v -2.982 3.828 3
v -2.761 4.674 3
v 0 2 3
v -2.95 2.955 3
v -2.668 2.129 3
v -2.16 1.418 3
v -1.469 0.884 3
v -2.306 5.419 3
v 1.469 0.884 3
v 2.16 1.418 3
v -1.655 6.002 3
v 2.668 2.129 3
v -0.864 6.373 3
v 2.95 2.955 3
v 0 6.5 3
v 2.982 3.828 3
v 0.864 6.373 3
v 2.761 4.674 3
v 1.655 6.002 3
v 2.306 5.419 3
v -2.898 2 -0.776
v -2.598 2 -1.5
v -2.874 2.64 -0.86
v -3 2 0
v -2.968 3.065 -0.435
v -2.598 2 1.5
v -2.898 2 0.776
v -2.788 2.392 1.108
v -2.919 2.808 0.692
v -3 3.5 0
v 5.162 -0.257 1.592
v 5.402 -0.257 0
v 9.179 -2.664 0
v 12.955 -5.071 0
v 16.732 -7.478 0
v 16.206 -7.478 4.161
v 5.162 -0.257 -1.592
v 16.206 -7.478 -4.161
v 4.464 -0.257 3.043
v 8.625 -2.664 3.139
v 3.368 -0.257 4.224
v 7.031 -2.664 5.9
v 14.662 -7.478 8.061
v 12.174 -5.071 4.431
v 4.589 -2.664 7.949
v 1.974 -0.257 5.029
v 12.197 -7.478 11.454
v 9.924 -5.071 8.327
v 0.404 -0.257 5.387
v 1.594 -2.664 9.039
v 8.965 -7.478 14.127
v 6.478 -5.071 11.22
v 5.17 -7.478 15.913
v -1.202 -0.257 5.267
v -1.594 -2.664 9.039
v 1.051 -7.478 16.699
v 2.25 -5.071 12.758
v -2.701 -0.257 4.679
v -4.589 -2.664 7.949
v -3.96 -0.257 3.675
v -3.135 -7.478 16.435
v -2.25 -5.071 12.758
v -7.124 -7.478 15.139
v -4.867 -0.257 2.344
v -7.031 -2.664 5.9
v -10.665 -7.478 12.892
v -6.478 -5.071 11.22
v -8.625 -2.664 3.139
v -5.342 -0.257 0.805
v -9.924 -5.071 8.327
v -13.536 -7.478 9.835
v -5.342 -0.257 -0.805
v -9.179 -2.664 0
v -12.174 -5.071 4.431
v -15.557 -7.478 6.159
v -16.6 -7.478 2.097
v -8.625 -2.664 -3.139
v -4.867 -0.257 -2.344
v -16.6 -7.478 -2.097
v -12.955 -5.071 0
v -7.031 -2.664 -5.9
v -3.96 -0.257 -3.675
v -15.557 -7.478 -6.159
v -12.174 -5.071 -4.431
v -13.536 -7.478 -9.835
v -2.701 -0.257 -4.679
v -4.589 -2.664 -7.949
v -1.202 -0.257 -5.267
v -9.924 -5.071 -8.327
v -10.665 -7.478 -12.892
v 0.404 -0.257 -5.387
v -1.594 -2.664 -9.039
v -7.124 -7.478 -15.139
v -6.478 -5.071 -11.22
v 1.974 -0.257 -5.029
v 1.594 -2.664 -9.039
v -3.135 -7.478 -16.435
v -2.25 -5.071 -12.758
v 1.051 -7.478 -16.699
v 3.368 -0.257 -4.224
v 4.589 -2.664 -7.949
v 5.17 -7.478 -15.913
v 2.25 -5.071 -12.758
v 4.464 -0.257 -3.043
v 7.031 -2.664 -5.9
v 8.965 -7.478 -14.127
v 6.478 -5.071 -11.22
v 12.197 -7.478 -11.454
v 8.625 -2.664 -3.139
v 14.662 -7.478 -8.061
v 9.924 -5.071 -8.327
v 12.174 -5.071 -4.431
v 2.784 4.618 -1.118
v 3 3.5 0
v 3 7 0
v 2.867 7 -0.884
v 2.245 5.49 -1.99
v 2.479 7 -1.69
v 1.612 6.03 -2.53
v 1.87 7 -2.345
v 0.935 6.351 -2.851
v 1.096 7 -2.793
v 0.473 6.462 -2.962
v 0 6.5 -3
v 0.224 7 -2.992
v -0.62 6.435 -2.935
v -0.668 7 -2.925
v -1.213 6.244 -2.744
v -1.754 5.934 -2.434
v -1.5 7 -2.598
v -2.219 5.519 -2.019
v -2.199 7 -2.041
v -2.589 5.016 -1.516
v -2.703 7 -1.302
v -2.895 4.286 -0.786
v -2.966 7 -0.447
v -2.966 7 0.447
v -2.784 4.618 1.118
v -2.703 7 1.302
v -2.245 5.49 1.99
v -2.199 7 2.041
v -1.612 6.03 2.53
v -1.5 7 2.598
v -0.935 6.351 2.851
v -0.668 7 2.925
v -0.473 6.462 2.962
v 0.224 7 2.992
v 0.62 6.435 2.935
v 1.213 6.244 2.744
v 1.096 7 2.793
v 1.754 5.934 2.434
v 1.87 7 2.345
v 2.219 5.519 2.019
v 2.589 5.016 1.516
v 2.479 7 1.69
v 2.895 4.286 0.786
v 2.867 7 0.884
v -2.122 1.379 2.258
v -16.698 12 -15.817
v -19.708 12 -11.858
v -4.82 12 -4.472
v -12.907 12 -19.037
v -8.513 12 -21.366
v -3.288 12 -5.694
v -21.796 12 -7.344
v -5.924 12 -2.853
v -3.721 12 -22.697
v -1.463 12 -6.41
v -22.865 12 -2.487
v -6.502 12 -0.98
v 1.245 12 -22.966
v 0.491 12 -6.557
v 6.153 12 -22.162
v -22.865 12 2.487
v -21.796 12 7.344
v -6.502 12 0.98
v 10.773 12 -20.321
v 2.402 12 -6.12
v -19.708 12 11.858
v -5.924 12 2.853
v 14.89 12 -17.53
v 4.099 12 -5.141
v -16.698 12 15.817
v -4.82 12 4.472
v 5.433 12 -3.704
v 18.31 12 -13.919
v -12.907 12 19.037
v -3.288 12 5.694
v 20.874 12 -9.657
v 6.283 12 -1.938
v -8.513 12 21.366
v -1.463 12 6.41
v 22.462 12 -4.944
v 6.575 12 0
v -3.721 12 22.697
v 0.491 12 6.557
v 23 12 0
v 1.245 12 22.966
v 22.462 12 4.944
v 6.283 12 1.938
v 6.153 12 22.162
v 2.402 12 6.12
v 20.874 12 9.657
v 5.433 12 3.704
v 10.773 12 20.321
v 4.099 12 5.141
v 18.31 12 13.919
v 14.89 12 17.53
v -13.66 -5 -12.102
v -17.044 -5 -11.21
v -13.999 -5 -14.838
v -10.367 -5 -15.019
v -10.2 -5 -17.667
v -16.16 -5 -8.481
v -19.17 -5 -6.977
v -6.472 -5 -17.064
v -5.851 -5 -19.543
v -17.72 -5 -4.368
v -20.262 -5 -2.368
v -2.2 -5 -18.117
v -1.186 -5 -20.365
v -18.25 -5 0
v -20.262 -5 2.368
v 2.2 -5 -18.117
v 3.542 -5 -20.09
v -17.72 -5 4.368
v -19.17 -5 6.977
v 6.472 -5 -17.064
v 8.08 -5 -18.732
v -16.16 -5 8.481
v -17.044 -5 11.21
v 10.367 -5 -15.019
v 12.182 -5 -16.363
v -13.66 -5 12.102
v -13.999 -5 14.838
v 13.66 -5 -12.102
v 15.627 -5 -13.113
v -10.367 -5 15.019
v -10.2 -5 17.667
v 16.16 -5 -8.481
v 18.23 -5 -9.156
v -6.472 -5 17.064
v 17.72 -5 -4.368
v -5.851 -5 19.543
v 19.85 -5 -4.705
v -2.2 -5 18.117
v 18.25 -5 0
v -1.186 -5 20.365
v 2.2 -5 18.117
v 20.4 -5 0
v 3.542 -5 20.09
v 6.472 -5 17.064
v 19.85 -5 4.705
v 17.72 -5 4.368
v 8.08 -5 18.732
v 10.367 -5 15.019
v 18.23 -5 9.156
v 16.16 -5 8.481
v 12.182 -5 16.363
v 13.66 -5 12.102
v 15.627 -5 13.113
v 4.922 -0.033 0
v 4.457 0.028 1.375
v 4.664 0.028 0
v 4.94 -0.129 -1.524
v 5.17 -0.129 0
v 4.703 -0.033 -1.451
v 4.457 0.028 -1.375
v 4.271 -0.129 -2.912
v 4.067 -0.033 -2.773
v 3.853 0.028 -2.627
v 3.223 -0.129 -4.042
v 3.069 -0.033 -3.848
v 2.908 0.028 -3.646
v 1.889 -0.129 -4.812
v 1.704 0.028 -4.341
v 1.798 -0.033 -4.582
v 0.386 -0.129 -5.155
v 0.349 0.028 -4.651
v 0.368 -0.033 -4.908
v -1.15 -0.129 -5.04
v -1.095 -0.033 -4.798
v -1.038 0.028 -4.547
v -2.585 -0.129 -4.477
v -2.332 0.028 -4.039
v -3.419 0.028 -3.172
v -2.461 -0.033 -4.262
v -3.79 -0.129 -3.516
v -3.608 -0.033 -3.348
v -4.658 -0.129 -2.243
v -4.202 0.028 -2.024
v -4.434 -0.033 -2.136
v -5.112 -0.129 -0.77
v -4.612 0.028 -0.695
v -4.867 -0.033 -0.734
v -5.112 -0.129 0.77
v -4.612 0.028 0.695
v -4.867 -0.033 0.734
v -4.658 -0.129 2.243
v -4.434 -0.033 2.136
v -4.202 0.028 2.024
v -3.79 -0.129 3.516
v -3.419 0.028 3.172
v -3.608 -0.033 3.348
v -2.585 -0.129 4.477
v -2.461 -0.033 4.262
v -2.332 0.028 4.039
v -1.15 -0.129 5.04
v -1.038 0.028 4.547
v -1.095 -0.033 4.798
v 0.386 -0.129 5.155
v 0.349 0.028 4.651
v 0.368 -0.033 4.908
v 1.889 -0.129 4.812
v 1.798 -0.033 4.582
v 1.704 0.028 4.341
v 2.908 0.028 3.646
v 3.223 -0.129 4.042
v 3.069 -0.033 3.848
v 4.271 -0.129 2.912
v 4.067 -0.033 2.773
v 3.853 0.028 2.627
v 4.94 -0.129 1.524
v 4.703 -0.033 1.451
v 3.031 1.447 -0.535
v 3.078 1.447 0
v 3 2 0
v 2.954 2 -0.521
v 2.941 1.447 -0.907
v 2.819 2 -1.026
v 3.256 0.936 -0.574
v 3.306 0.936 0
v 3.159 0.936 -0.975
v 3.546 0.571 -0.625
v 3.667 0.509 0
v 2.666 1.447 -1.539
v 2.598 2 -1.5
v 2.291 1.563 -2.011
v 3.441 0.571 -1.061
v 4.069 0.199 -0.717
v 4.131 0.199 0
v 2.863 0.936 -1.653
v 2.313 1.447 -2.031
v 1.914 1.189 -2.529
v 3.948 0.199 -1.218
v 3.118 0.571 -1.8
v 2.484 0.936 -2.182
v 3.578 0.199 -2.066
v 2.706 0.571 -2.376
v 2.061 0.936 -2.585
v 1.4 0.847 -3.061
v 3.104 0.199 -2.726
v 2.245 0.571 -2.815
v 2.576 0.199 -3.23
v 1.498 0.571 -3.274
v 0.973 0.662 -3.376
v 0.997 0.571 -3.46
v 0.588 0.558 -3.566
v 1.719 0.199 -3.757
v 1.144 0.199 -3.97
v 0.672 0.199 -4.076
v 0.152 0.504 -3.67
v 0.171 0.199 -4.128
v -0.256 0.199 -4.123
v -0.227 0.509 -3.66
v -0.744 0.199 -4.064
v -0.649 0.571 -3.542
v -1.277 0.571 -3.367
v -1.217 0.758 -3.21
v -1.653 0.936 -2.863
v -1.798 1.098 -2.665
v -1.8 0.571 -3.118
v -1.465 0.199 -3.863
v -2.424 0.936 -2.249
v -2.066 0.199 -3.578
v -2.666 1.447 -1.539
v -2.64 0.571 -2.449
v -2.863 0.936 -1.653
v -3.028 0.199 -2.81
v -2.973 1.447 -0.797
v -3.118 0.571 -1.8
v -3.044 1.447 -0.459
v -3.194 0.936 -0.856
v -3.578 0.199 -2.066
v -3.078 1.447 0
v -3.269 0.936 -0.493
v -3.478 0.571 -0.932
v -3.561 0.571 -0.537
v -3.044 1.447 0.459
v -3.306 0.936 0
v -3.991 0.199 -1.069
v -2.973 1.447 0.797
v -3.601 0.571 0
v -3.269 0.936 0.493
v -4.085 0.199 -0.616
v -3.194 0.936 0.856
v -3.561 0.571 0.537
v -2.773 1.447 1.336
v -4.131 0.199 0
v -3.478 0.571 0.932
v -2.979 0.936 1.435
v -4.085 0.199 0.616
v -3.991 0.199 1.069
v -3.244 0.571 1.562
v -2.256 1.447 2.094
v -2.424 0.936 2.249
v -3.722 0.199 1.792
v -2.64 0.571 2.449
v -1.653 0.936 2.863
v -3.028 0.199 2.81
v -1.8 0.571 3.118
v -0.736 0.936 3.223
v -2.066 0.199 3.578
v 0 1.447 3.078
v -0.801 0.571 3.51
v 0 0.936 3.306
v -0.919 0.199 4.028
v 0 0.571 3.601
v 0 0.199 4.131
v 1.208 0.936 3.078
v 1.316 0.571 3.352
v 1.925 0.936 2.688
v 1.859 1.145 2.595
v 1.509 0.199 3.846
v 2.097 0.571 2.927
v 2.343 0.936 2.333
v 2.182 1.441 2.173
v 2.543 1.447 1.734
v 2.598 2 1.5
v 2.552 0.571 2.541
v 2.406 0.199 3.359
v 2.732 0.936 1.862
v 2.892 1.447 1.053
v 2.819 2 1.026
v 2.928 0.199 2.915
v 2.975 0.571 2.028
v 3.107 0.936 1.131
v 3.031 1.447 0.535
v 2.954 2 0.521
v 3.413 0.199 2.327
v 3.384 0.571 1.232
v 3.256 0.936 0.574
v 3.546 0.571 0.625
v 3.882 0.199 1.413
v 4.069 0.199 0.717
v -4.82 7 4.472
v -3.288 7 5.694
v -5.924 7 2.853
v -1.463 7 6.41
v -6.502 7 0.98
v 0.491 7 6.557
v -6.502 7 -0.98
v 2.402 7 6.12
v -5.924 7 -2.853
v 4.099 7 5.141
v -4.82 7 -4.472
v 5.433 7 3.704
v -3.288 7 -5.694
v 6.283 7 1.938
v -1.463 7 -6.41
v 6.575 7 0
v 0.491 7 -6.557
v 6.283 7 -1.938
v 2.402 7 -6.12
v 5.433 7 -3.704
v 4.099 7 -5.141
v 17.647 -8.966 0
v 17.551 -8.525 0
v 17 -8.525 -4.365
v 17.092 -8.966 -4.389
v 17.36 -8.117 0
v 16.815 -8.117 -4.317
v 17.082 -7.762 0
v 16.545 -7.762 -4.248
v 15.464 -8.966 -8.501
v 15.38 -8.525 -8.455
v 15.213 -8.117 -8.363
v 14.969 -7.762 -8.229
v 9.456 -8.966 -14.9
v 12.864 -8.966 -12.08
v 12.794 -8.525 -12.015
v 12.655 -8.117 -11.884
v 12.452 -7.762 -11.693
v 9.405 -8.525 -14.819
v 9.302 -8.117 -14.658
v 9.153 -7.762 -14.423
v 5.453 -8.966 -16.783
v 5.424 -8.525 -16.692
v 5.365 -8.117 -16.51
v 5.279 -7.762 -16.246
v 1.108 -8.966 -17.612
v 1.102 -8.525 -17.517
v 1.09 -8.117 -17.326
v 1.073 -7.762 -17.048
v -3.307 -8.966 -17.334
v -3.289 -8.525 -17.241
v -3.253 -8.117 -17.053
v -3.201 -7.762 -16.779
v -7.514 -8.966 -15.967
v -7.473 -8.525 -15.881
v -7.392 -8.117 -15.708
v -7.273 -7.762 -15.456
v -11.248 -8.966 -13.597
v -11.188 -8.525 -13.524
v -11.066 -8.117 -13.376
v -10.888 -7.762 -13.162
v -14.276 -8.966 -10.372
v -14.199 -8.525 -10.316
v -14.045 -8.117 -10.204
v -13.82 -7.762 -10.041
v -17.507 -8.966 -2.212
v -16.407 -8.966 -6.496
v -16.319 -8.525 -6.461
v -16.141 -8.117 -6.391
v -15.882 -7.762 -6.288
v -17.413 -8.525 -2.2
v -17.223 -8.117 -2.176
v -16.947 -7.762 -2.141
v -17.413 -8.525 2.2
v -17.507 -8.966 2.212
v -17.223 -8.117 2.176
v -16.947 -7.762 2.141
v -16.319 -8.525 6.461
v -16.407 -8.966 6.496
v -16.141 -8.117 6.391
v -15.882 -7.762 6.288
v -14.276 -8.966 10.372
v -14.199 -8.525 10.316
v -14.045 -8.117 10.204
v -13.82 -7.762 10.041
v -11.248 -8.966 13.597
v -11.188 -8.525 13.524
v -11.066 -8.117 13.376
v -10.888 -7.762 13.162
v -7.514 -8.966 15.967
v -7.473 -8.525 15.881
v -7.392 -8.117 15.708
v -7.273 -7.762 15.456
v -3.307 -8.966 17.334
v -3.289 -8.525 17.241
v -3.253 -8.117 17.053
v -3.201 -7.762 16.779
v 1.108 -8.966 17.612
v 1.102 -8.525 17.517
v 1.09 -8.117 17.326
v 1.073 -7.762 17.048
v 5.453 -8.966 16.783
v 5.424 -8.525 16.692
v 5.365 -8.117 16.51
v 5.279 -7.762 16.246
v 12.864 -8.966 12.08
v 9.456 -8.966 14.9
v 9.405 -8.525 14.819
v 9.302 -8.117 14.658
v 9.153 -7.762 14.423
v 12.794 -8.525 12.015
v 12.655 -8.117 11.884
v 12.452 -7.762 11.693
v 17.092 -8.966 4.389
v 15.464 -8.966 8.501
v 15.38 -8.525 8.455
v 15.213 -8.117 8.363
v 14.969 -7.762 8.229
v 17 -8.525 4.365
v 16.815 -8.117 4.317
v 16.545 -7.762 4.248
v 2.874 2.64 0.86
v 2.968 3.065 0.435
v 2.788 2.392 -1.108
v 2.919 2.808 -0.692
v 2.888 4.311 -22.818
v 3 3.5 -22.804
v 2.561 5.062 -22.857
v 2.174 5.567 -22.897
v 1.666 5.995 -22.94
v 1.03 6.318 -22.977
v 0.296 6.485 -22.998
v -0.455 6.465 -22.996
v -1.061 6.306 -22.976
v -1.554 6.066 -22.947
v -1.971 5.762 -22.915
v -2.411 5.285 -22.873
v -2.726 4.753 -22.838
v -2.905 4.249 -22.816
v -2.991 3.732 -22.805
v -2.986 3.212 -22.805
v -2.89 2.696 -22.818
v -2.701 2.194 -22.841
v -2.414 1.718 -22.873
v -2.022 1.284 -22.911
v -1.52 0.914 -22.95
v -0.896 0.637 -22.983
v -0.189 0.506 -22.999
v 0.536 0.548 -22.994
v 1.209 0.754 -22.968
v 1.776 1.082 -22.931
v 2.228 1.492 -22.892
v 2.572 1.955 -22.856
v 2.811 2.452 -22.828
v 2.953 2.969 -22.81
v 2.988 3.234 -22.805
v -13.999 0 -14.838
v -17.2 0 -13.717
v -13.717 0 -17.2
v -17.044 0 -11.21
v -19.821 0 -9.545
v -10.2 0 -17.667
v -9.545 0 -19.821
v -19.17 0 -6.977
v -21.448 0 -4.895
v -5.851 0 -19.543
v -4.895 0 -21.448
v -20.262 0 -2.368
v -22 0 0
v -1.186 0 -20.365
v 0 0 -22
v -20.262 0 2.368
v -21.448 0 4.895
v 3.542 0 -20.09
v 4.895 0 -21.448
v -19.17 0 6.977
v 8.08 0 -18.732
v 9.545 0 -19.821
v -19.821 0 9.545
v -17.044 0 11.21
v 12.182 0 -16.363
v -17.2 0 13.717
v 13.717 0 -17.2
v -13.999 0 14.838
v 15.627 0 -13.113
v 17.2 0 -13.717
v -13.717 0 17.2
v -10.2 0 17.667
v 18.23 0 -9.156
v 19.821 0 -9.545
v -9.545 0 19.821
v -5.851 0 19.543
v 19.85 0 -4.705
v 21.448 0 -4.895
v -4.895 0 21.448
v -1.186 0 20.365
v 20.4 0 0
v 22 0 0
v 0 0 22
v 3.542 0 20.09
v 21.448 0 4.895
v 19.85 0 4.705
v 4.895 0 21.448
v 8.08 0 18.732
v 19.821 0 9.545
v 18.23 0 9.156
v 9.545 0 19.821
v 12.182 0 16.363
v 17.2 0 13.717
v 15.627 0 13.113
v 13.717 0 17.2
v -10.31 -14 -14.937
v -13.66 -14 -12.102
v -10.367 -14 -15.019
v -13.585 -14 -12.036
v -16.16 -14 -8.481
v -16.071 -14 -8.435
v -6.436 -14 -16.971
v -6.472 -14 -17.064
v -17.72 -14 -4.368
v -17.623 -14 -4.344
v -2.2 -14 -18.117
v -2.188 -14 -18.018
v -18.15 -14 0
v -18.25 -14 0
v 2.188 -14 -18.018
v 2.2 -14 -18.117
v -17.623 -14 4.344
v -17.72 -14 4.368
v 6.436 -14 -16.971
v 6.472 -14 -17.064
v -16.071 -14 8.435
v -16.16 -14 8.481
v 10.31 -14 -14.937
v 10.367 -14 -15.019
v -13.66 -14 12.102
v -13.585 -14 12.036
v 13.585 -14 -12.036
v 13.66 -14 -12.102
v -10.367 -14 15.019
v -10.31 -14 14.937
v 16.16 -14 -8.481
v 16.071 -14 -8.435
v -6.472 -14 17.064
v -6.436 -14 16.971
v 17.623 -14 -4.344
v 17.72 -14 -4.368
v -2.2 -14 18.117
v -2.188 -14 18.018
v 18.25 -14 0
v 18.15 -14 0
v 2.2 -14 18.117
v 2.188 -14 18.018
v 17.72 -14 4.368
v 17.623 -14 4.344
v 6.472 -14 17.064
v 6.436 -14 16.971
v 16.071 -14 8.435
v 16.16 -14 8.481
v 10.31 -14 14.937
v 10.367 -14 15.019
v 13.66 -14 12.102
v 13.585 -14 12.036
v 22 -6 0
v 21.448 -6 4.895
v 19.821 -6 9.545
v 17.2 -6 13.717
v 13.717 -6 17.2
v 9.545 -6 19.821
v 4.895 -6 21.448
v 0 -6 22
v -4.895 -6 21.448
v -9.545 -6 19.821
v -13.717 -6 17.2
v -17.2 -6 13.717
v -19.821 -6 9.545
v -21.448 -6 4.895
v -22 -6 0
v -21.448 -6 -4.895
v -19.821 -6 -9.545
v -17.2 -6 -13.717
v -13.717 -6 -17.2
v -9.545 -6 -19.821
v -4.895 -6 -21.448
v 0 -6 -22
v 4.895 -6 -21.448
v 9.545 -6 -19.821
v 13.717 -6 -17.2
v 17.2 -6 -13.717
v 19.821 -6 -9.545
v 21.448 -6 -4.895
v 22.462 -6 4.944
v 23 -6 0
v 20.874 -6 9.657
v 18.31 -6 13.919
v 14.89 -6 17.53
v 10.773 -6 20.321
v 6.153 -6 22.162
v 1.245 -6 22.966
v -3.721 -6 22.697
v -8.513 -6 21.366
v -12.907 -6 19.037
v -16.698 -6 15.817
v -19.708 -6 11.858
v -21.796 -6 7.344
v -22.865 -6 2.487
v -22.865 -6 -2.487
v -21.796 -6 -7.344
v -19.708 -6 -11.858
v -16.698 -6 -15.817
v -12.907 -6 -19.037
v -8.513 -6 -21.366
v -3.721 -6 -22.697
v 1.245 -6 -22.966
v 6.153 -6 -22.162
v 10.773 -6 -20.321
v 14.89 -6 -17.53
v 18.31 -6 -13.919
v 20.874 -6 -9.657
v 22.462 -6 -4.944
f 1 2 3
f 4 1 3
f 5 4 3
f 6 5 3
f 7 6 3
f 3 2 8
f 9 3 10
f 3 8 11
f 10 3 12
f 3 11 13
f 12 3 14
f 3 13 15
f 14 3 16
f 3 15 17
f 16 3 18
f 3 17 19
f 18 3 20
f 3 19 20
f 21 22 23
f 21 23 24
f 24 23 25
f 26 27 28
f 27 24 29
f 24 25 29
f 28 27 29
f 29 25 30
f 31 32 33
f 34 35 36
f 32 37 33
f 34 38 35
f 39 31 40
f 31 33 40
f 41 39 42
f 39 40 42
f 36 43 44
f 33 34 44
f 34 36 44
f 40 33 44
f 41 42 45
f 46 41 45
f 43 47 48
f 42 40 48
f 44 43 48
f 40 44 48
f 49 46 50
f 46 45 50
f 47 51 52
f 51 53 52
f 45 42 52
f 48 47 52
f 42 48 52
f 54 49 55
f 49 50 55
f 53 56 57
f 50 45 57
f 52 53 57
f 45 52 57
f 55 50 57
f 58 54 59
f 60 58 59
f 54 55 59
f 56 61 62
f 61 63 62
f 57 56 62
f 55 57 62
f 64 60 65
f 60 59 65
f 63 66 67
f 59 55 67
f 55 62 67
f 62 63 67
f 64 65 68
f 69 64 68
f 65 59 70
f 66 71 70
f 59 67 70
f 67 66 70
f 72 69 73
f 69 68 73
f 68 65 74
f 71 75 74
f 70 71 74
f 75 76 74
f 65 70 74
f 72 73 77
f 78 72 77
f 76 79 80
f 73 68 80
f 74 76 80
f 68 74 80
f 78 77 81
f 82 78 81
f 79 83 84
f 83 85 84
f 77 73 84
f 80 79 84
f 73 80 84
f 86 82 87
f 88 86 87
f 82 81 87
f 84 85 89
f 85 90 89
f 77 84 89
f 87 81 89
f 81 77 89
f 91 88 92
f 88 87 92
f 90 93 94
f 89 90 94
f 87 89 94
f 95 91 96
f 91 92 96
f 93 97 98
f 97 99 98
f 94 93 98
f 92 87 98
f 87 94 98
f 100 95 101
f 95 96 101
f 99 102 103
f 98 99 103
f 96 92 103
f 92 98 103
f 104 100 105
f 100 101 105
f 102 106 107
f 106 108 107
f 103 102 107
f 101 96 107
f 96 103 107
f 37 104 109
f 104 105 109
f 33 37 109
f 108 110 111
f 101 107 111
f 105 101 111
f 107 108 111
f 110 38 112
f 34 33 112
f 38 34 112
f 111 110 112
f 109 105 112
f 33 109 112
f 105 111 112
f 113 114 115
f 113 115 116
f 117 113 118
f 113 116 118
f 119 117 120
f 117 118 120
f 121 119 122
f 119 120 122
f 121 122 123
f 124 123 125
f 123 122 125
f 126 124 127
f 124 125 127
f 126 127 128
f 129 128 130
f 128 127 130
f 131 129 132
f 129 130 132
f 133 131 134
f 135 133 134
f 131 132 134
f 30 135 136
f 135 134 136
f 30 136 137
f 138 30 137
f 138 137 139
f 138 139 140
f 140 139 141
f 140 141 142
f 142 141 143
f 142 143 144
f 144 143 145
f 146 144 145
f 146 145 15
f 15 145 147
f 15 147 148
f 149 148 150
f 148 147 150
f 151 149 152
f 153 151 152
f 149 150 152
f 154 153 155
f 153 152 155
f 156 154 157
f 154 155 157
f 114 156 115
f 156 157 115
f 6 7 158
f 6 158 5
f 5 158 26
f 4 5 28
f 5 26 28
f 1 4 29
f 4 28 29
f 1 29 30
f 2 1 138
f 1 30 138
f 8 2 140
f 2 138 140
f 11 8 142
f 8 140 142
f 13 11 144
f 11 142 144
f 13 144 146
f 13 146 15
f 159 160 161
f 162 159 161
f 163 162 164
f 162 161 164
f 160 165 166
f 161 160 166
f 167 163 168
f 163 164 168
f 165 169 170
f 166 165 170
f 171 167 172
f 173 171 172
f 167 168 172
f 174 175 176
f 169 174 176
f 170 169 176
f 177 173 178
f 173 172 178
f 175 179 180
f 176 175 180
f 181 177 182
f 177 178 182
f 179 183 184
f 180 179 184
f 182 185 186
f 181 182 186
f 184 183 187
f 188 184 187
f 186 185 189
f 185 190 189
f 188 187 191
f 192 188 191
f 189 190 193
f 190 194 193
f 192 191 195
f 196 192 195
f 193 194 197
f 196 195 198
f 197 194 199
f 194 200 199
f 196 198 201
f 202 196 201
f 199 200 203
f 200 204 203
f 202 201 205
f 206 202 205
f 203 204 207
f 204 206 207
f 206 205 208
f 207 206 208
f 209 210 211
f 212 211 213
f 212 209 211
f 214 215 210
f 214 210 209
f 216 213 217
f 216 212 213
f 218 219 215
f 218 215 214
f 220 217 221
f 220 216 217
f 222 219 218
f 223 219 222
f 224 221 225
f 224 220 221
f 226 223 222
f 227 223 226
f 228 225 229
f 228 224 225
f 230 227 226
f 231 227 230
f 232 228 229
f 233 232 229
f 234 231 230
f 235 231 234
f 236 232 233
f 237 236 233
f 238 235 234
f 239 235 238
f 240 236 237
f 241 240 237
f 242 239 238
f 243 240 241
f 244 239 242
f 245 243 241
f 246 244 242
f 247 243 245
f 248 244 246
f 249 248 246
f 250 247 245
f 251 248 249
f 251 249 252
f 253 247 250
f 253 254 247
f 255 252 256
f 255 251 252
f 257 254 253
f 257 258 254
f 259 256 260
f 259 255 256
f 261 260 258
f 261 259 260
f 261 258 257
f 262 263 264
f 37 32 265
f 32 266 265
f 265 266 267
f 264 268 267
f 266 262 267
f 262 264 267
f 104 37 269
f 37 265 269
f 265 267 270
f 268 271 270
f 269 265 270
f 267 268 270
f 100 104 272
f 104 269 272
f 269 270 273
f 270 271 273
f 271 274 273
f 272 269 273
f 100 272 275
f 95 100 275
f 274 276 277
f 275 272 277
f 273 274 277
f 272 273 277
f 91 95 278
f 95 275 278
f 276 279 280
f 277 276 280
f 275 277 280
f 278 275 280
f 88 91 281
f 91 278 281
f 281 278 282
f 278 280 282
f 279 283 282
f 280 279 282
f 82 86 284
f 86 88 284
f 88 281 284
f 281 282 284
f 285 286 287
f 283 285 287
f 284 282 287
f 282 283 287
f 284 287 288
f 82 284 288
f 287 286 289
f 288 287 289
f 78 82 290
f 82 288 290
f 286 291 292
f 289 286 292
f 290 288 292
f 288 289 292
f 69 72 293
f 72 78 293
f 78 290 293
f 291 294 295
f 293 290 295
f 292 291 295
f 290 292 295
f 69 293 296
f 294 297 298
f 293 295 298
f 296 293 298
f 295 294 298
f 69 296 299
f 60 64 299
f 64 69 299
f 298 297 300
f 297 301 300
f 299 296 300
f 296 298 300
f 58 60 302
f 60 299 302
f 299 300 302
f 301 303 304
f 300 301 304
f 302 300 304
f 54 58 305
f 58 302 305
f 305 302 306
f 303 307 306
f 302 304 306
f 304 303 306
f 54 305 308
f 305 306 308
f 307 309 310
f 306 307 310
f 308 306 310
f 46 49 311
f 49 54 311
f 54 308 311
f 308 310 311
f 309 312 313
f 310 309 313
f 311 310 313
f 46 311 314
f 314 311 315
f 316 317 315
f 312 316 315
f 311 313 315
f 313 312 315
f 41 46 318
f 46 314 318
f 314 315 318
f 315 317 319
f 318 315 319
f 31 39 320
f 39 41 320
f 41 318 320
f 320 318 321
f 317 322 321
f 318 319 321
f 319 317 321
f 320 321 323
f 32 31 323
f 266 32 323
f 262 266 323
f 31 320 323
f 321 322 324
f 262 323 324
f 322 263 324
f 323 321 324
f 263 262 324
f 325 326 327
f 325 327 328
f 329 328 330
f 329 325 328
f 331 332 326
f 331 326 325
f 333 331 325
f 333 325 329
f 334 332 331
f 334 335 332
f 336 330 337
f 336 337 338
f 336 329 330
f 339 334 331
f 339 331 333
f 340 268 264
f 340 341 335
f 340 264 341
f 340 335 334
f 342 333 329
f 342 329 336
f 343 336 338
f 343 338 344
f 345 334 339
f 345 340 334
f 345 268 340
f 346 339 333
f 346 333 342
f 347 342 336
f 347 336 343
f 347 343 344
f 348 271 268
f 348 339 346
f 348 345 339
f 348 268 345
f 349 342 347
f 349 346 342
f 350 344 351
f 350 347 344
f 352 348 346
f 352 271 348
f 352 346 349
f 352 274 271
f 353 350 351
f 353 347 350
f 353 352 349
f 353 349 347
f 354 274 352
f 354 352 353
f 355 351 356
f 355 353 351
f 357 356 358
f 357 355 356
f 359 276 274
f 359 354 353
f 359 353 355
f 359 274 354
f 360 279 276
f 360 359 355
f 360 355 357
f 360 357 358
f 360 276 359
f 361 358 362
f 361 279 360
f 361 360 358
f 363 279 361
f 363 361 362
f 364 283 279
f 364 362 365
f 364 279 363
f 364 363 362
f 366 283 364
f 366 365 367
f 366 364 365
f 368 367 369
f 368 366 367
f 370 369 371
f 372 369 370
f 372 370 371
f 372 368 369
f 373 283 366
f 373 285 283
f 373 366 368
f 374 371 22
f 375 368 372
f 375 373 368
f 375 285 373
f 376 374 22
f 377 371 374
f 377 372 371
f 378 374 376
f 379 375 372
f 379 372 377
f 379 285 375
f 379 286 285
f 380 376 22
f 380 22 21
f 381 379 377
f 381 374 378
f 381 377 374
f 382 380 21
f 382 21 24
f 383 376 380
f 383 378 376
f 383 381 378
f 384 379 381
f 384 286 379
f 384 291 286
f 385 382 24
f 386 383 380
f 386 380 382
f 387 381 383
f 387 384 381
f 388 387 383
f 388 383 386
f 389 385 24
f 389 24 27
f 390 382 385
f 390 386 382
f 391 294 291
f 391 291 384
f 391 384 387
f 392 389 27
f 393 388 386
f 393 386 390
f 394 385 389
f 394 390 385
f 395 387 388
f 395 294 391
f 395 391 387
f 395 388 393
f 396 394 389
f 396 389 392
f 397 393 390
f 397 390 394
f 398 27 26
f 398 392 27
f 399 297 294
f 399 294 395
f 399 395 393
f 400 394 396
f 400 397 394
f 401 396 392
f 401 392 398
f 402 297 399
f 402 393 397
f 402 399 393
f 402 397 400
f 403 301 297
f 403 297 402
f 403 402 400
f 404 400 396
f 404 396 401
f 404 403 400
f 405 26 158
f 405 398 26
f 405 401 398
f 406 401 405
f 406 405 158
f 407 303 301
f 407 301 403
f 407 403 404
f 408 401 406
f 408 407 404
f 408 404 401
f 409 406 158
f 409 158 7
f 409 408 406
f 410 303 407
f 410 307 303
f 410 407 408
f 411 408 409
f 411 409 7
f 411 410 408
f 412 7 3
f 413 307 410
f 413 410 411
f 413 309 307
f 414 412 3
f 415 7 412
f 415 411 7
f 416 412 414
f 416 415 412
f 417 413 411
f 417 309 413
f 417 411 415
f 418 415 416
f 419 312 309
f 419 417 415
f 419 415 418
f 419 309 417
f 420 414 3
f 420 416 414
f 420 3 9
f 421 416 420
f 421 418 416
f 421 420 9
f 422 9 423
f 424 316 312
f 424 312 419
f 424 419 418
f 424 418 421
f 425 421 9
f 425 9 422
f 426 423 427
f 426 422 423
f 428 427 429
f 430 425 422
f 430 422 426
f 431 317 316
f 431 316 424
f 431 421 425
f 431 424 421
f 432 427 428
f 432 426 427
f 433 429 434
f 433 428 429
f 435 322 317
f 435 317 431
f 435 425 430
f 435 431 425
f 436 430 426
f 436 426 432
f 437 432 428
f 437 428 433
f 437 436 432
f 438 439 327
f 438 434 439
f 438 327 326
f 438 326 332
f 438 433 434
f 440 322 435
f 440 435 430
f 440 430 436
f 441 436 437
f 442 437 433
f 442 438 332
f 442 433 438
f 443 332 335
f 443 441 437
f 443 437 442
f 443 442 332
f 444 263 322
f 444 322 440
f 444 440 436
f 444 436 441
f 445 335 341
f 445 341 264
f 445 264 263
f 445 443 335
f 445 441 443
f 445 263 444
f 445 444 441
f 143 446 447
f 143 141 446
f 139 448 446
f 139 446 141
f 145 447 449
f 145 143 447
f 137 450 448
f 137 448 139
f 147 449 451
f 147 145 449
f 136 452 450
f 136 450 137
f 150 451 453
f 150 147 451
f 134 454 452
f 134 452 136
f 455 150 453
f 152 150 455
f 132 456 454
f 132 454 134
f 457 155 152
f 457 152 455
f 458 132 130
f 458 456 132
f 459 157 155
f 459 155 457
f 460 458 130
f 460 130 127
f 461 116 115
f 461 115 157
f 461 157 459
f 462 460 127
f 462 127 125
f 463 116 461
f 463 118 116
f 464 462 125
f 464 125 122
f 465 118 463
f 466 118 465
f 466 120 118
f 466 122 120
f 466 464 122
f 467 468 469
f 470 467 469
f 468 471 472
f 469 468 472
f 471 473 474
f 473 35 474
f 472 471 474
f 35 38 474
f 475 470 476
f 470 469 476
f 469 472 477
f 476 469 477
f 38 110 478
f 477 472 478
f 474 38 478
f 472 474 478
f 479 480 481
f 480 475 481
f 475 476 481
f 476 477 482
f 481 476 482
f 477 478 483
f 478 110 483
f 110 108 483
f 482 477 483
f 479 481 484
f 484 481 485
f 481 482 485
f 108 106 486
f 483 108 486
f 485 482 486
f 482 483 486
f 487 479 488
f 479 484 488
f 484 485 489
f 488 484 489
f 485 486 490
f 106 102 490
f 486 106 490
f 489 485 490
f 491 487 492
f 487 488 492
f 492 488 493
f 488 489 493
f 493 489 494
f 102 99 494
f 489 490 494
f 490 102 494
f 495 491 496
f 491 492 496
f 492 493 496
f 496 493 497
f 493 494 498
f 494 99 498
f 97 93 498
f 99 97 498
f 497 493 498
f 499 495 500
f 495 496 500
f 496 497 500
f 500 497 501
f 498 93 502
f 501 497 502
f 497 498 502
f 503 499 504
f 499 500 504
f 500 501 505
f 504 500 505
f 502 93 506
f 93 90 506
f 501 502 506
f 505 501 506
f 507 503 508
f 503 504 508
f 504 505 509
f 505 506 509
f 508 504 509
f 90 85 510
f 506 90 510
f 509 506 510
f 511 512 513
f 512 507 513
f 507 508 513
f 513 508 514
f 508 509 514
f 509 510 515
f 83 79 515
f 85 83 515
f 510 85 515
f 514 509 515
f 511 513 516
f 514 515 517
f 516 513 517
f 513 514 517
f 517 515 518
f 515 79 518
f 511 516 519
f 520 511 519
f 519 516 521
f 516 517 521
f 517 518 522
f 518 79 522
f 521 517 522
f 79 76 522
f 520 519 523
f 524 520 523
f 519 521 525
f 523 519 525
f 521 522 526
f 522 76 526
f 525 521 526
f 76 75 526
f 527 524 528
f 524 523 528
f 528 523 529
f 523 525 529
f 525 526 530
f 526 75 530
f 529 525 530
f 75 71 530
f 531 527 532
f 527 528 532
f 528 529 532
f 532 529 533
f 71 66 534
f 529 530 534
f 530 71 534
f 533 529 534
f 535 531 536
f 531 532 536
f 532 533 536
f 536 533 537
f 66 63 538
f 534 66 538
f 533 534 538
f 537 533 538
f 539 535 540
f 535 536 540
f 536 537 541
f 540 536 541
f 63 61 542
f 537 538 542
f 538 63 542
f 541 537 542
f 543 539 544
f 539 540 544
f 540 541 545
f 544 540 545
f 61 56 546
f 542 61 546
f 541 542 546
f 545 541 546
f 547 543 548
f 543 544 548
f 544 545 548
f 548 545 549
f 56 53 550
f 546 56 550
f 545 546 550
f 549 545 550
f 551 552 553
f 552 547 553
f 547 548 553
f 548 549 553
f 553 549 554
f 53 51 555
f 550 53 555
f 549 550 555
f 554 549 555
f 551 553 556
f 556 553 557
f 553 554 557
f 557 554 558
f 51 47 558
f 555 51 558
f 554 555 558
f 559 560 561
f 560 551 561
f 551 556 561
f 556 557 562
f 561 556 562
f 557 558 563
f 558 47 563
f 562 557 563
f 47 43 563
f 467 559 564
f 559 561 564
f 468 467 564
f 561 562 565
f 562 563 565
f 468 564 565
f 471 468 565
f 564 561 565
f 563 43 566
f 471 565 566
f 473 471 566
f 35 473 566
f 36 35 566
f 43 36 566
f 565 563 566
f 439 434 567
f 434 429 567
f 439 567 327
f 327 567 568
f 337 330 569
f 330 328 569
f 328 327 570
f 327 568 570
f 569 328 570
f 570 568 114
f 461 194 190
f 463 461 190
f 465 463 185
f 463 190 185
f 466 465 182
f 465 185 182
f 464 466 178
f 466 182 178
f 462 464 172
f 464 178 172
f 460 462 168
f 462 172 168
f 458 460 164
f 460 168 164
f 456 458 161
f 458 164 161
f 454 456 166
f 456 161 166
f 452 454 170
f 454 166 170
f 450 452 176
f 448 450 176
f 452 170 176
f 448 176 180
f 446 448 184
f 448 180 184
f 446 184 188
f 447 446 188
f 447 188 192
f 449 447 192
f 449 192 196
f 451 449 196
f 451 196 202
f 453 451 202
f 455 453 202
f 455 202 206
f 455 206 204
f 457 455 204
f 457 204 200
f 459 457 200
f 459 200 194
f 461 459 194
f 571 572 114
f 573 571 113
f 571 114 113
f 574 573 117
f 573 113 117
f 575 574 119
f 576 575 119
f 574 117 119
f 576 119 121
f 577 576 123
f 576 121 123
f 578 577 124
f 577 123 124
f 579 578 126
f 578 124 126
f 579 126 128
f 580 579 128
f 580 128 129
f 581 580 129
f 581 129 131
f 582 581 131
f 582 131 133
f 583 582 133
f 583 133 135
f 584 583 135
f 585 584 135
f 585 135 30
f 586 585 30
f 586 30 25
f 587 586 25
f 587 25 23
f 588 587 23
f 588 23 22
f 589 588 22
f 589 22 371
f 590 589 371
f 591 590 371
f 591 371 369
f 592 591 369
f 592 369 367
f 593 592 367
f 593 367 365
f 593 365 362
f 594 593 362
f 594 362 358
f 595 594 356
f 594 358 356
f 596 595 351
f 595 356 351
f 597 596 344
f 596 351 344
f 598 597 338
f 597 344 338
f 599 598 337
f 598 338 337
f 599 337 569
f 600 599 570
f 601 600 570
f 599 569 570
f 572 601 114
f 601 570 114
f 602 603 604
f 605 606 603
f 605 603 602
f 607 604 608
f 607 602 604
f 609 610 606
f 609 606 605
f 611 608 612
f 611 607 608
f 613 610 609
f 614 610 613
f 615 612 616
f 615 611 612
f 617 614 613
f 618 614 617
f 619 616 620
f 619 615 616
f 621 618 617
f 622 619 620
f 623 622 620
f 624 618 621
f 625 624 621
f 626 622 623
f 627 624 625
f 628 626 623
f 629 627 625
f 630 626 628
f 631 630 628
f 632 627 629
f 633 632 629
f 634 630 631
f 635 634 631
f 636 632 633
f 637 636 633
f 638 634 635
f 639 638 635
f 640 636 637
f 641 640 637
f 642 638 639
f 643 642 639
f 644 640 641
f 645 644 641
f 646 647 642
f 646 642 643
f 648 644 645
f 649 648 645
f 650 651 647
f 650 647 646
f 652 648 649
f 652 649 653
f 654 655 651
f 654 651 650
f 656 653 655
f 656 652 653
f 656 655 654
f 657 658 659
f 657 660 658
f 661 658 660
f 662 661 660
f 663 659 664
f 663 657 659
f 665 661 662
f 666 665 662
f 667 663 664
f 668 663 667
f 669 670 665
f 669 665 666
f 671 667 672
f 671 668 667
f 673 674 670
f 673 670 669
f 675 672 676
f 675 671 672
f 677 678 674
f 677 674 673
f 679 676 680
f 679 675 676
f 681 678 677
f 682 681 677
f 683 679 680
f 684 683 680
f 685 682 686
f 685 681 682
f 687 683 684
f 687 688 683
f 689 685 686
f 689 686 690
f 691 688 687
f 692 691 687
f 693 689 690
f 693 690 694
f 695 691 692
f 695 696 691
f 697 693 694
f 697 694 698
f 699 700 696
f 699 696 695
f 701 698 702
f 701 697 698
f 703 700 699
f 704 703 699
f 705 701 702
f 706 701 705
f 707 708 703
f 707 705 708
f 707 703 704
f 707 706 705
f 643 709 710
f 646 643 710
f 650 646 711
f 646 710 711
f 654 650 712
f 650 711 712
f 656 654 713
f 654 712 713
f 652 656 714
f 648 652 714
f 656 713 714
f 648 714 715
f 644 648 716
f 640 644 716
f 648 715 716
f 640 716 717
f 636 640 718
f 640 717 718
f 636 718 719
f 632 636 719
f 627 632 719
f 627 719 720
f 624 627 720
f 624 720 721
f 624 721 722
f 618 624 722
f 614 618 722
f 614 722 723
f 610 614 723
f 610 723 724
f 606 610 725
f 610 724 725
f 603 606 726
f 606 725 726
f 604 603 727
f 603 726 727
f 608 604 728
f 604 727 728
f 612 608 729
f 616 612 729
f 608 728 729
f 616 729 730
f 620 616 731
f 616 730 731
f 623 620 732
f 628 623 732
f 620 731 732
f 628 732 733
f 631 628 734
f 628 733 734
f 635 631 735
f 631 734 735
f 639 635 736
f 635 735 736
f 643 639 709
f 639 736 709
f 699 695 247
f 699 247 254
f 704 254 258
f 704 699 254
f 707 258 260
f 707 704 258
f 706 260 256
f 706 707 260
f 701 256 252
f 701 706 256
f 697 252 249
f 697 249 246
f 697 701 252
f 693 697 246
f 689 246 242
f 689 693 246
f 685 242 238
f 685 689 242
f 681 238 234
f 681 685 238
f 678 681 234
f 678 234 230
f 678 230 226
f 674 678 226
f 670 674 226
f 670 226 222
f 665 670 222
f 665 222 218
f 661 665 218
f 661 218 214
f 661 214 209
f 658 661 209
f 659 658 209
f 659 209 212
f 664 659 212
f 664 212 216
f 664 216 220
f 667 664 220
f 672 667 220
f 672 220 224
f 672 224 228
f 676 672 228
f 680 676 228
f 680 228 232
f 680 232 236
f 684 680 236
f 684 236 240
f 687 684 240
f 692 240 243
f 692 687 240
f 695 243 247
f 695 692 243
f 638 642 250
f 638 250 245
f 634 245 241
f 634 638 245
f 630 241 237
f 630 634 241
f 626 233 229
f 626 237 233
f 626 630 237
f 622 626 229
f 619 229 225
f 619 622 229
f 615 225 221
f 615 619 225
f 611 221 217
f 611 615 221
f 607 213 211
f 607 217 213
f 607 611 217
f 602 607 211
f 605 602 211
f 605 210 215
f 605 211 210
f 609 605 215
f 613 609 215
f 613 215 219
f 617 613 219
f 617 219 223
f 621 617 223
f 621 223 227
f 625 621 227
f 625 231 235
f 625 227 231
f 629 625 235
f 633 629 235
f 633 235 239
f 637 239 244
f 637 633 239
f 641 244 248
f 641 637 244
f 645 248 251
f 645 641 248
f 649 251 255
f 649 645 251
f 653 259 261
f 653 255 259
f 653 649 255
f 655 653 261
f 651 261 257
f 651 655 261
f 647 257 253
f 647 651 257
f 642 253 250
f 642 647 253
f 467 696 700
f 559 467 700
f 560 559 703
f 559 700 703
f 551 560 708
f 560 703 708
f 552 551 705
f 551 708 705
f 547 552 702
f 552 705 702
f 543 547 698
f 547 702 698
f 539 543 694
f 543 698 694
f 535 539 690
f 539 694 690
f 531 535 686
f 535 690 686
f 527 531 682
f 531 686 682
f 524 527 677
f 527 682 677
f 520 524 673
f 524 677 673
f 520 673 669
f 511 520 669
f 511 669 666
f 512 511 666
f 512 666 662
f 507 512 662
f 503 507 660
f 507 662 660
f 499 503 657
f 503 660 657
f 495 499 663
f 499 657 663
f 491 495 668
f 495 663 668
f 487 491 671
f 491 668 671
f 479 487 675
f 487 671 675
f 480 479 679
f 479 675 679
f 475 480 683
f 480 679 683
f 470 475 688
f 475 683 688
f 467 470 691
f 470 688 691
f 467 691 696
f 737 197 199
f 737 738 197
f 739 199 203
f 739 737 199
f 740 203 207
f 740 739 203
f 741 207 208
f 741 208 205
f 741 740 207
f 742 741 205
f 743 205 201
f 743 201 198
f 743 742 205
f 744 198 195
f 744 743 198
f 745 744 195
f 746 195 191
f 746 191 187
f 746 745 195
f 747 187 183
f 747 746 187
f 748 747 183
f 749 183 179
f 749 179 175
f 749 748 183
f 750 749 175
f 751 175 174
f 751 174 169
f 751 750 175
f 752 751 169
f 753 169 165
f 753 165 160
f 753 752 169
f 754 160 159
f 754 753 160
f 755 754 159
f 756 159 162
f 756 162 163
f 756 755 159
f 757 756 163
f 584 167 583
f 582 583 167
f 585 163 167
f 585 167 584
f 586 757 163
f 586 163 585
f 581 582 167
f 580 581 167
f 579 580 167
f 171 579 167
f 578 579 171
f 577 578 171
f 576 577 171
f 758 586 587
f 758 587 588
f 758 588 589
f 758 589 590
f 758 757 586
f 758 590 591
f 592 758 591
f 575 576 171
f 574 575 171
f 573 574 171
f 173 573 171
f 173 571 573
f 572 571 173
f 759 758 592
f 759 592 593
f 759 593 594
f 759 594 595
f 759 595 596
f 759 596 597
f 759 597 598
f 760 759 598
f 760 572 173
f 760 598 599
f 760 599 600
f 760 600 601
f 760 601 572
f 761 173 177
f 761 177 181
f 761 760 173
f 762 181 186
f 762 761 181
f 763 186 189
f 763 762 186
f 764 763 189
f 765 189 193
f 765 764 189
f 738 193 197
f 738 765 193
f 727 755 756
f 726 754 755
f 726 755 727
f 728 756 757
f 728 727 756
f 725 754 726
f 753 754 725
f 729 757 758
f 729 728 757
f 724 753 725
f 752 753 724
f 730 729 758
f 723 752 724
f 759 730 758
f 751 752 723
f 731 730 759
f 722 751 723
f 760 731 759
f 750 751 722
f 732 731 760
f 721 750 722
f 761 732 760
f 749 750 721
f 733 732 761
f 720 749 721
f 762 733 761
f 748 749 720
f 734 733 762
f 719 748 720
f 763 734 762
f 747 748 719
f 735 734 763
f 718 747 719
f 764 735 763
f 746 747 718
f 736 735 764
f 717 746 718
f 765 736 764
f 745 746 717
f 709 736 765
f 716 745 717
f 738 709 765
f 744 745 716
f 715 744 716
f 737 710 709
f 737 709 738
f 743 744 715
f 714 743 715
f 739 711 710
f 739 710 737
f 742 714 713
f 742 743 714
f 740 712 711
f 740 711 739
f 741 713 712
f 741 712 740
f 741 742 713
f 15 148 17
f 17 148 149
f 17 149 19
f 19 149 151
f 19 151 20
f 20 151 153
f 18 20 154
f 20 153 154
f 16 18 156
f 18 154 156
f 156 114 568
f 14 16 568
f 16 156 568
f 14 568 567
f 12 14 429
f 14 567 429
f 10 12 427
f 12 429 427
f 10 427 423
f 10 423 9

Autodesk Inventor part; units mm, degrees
ref_plane "YZ Plane" through (0, 0, 0) normal (1, 0, 0) x (0, 1, 0)
ref_plane "XZ Plane" through (0, 0, 0) normal (0, 1, 0) x (-1, 0, 0)
ref_plane "XY Plane" through (0, 0, 0) normal (0, 0, 1) x (1, 0, 0)
sketch "Sketch1" plane through (0, 0, 0) normal (0, 0, 1) x (1, 0, 0)
  line L0 (3, 12) -> (23, 12)
  line L1 (23, 12) -> (23, 0)
  line L2 (3, 2) -> (3, 12)
  line L3 (0, 19.5472) -> (0, -22.4151)
  line L4 (23, 0) -> (22, 0) construction
  line L5 (22, 0) -> (22, -6)
  line L6 (22, -6) -> (23, -6)
  line L7 (23, -6) -> (23, 0)
  line L8 (20.4, 0) -> (17.25, 0) construction
  line L9 (17.25, 0) -> (17.25, -5) construction
  line L10 (17.25, -5) -> (20.4, -5) construction
  line L11 (20.4, -5) -> (20.4, 0)
  arc A0 (3, 2) -> (4.6637, 0.0285) centre (5, 2) ccw
  line L12 (22, 0) -> (20.4, 0)
  line L13 (17.25, 0) -> (5, 0)
  line L14 (-20.0393, 0) -> (22, 0) construction
  line L15 (23, 0) -> (24.5476, 0) construction
  line L16 (18.25, 0) -> (18.25, -5) construction
  line L17 (20.4, -5) -> (18.25, -5)
  line L18 (18.25, -5) -> (18.25, -14)
  line L19 (18.25, -14) -> (18.15, -14)
  line L20 (18.15, -14) -> (17.25, -5) construction
  line L21 (18.25, -8) -> (17.55, -8) construction
  line L22 (5.4025, -0.2566) -> (16.7316, -7.4783)
  line L23 (17.6466, -8.9658) -> (18.15, -14)
  arc A1 (17.6466, -8.9658) -> (16.7316, -7.4783) centre (15.6565, -9.1648) ccw
  arc A2 (5.4025, -0.2566) -> (4.6637, 0.0285) centre (4.3274, -1.943) ccw
  point P0 (0, 0)
  point P1 (17.25, 0)
  point P2 (17.25, -5)
  point P3 (5, 0)
  point P4 (17.9, -8)
  dimension "d0" = 6
  dimension "d2" = 1
  dimension "d5" = 5
  dimension "d6" = 1.6
  dimension "d7" = 44
  dimension "d11" = 2
  dimension "d12" = 12
  dimension "d14" = 6
  dimension "d23" = 36.5
  dimension "d24" = 1
  dimension "d25" = 0.1
  dimension "d26" = 9
  dimension "d37" = 3
  dimension "d38" = 2
  dimension "d39" = 2
revolve "Revolution1" add sketch "Sketch1" angle 360 about axis through (0, 19.5472, 0) along (0, -1, 0)
sketch "Sketch2" plane through (0, 0, 0) normal (0, 0, 1) x (1, 0, 0)
  line L0 (-3, 12) -> (3, 12) projected
  line L1 (0, 12) -> (0, 0) construction
  line L2 (-3, 2) -> (3, 2) construction
  circle A0 centre (0, 3.5) radius 3
  line L3 (-20.4, 0) -> (20.4, 0) projected
  point P0 (2.5981, 2)
  point P1 (-2.5981, 2)
  dimension "d16" = 6
  dimension "d40" = 3.5
extrude "Extrusion1" cut sketch "Sketch2" along normal blind 3 and the other way blind 33
sketch "Sketch3" plane through (0, 12, 0) normal (0, 1, 0) x (1, 0, 0)
  circle A0 centre (0, 0) radius 6.575
  circle A1 centre (0, 0) radius 3 construction
  dimension "d27" = 13.15
extrude "Extrusion2" cut sketch "Sketch3" against normal blind 5
equation "\"d0\" = t_D"
equation "\"d2\" = w_th"
equation "\"d5\" = b_rim_h"
equation "\"d6\" = lv_th"
equation "\"d7\" = b_OD"
equation "\"d11\" = fillet_D"
equation "\"d12\" = top_th_f"
equation "\"d14\" = w_l"
equation "\"d23\" = b_ID"
equation "\"d24\" = w_th"
equation "\"d25\" = tol"
equation "\"d26\" = 1.5 * w_l"
equation "\"d37\" = 0.5 * w_l"
equation "\"d38\" = fillet_D"
equation "\"d39\" = fillet_D"
equation "\"d16\" = t_D"
equation "\"d40\" = 0.5 * w_th + 0.5 * t_D"
equation "\"d18\" = 0.5 * t_D"
equation "\"d19\" = 0.75 * b_OD"
equation "\"d27\" = cn_D"
equation "\"d30\" = cn_h"
equation "\"tol\" = 0.1"
equation "\"fillet_D\" = 2"
equation "\"w_th\" = 1"
equation "\"w_l\" = 6"
equation "\"t_D\" = 6"
equation "\"t_D_f\" = t_D + w_th"
equation "\"top_th_f\" = t_D_f + cn_h"
equation "\"cn_h\" = 5"
equation "\"lv_th\" = 1.6"
equation "\"d3\" = w_l"
equation "\"d8\" = top_th_f"
equation "\"b_ID\" = 36.5"
equation "\"b_OD\" = 44"
equation "\"b_rim_h\" = 5"
equation "\"top_th\" = t_D + w_th"
equation "\"lv_OD\" = 26"
equation "\"sv_OD\" = 13"
equation "\"sv_th\" = 1.5"
equation "\"b_th\" = 1.5"
equation "\"h_s\" = 2.25"
equation "\"h_D\" = 0.75"
equation "\"v_h_D\" = 7.5"
equation "\"v_h_off\" = 0.5 * cn_D + 0.5 * v_h_D"
equation "\"cn_D\" = 13.15"
properties part number "bottle"
